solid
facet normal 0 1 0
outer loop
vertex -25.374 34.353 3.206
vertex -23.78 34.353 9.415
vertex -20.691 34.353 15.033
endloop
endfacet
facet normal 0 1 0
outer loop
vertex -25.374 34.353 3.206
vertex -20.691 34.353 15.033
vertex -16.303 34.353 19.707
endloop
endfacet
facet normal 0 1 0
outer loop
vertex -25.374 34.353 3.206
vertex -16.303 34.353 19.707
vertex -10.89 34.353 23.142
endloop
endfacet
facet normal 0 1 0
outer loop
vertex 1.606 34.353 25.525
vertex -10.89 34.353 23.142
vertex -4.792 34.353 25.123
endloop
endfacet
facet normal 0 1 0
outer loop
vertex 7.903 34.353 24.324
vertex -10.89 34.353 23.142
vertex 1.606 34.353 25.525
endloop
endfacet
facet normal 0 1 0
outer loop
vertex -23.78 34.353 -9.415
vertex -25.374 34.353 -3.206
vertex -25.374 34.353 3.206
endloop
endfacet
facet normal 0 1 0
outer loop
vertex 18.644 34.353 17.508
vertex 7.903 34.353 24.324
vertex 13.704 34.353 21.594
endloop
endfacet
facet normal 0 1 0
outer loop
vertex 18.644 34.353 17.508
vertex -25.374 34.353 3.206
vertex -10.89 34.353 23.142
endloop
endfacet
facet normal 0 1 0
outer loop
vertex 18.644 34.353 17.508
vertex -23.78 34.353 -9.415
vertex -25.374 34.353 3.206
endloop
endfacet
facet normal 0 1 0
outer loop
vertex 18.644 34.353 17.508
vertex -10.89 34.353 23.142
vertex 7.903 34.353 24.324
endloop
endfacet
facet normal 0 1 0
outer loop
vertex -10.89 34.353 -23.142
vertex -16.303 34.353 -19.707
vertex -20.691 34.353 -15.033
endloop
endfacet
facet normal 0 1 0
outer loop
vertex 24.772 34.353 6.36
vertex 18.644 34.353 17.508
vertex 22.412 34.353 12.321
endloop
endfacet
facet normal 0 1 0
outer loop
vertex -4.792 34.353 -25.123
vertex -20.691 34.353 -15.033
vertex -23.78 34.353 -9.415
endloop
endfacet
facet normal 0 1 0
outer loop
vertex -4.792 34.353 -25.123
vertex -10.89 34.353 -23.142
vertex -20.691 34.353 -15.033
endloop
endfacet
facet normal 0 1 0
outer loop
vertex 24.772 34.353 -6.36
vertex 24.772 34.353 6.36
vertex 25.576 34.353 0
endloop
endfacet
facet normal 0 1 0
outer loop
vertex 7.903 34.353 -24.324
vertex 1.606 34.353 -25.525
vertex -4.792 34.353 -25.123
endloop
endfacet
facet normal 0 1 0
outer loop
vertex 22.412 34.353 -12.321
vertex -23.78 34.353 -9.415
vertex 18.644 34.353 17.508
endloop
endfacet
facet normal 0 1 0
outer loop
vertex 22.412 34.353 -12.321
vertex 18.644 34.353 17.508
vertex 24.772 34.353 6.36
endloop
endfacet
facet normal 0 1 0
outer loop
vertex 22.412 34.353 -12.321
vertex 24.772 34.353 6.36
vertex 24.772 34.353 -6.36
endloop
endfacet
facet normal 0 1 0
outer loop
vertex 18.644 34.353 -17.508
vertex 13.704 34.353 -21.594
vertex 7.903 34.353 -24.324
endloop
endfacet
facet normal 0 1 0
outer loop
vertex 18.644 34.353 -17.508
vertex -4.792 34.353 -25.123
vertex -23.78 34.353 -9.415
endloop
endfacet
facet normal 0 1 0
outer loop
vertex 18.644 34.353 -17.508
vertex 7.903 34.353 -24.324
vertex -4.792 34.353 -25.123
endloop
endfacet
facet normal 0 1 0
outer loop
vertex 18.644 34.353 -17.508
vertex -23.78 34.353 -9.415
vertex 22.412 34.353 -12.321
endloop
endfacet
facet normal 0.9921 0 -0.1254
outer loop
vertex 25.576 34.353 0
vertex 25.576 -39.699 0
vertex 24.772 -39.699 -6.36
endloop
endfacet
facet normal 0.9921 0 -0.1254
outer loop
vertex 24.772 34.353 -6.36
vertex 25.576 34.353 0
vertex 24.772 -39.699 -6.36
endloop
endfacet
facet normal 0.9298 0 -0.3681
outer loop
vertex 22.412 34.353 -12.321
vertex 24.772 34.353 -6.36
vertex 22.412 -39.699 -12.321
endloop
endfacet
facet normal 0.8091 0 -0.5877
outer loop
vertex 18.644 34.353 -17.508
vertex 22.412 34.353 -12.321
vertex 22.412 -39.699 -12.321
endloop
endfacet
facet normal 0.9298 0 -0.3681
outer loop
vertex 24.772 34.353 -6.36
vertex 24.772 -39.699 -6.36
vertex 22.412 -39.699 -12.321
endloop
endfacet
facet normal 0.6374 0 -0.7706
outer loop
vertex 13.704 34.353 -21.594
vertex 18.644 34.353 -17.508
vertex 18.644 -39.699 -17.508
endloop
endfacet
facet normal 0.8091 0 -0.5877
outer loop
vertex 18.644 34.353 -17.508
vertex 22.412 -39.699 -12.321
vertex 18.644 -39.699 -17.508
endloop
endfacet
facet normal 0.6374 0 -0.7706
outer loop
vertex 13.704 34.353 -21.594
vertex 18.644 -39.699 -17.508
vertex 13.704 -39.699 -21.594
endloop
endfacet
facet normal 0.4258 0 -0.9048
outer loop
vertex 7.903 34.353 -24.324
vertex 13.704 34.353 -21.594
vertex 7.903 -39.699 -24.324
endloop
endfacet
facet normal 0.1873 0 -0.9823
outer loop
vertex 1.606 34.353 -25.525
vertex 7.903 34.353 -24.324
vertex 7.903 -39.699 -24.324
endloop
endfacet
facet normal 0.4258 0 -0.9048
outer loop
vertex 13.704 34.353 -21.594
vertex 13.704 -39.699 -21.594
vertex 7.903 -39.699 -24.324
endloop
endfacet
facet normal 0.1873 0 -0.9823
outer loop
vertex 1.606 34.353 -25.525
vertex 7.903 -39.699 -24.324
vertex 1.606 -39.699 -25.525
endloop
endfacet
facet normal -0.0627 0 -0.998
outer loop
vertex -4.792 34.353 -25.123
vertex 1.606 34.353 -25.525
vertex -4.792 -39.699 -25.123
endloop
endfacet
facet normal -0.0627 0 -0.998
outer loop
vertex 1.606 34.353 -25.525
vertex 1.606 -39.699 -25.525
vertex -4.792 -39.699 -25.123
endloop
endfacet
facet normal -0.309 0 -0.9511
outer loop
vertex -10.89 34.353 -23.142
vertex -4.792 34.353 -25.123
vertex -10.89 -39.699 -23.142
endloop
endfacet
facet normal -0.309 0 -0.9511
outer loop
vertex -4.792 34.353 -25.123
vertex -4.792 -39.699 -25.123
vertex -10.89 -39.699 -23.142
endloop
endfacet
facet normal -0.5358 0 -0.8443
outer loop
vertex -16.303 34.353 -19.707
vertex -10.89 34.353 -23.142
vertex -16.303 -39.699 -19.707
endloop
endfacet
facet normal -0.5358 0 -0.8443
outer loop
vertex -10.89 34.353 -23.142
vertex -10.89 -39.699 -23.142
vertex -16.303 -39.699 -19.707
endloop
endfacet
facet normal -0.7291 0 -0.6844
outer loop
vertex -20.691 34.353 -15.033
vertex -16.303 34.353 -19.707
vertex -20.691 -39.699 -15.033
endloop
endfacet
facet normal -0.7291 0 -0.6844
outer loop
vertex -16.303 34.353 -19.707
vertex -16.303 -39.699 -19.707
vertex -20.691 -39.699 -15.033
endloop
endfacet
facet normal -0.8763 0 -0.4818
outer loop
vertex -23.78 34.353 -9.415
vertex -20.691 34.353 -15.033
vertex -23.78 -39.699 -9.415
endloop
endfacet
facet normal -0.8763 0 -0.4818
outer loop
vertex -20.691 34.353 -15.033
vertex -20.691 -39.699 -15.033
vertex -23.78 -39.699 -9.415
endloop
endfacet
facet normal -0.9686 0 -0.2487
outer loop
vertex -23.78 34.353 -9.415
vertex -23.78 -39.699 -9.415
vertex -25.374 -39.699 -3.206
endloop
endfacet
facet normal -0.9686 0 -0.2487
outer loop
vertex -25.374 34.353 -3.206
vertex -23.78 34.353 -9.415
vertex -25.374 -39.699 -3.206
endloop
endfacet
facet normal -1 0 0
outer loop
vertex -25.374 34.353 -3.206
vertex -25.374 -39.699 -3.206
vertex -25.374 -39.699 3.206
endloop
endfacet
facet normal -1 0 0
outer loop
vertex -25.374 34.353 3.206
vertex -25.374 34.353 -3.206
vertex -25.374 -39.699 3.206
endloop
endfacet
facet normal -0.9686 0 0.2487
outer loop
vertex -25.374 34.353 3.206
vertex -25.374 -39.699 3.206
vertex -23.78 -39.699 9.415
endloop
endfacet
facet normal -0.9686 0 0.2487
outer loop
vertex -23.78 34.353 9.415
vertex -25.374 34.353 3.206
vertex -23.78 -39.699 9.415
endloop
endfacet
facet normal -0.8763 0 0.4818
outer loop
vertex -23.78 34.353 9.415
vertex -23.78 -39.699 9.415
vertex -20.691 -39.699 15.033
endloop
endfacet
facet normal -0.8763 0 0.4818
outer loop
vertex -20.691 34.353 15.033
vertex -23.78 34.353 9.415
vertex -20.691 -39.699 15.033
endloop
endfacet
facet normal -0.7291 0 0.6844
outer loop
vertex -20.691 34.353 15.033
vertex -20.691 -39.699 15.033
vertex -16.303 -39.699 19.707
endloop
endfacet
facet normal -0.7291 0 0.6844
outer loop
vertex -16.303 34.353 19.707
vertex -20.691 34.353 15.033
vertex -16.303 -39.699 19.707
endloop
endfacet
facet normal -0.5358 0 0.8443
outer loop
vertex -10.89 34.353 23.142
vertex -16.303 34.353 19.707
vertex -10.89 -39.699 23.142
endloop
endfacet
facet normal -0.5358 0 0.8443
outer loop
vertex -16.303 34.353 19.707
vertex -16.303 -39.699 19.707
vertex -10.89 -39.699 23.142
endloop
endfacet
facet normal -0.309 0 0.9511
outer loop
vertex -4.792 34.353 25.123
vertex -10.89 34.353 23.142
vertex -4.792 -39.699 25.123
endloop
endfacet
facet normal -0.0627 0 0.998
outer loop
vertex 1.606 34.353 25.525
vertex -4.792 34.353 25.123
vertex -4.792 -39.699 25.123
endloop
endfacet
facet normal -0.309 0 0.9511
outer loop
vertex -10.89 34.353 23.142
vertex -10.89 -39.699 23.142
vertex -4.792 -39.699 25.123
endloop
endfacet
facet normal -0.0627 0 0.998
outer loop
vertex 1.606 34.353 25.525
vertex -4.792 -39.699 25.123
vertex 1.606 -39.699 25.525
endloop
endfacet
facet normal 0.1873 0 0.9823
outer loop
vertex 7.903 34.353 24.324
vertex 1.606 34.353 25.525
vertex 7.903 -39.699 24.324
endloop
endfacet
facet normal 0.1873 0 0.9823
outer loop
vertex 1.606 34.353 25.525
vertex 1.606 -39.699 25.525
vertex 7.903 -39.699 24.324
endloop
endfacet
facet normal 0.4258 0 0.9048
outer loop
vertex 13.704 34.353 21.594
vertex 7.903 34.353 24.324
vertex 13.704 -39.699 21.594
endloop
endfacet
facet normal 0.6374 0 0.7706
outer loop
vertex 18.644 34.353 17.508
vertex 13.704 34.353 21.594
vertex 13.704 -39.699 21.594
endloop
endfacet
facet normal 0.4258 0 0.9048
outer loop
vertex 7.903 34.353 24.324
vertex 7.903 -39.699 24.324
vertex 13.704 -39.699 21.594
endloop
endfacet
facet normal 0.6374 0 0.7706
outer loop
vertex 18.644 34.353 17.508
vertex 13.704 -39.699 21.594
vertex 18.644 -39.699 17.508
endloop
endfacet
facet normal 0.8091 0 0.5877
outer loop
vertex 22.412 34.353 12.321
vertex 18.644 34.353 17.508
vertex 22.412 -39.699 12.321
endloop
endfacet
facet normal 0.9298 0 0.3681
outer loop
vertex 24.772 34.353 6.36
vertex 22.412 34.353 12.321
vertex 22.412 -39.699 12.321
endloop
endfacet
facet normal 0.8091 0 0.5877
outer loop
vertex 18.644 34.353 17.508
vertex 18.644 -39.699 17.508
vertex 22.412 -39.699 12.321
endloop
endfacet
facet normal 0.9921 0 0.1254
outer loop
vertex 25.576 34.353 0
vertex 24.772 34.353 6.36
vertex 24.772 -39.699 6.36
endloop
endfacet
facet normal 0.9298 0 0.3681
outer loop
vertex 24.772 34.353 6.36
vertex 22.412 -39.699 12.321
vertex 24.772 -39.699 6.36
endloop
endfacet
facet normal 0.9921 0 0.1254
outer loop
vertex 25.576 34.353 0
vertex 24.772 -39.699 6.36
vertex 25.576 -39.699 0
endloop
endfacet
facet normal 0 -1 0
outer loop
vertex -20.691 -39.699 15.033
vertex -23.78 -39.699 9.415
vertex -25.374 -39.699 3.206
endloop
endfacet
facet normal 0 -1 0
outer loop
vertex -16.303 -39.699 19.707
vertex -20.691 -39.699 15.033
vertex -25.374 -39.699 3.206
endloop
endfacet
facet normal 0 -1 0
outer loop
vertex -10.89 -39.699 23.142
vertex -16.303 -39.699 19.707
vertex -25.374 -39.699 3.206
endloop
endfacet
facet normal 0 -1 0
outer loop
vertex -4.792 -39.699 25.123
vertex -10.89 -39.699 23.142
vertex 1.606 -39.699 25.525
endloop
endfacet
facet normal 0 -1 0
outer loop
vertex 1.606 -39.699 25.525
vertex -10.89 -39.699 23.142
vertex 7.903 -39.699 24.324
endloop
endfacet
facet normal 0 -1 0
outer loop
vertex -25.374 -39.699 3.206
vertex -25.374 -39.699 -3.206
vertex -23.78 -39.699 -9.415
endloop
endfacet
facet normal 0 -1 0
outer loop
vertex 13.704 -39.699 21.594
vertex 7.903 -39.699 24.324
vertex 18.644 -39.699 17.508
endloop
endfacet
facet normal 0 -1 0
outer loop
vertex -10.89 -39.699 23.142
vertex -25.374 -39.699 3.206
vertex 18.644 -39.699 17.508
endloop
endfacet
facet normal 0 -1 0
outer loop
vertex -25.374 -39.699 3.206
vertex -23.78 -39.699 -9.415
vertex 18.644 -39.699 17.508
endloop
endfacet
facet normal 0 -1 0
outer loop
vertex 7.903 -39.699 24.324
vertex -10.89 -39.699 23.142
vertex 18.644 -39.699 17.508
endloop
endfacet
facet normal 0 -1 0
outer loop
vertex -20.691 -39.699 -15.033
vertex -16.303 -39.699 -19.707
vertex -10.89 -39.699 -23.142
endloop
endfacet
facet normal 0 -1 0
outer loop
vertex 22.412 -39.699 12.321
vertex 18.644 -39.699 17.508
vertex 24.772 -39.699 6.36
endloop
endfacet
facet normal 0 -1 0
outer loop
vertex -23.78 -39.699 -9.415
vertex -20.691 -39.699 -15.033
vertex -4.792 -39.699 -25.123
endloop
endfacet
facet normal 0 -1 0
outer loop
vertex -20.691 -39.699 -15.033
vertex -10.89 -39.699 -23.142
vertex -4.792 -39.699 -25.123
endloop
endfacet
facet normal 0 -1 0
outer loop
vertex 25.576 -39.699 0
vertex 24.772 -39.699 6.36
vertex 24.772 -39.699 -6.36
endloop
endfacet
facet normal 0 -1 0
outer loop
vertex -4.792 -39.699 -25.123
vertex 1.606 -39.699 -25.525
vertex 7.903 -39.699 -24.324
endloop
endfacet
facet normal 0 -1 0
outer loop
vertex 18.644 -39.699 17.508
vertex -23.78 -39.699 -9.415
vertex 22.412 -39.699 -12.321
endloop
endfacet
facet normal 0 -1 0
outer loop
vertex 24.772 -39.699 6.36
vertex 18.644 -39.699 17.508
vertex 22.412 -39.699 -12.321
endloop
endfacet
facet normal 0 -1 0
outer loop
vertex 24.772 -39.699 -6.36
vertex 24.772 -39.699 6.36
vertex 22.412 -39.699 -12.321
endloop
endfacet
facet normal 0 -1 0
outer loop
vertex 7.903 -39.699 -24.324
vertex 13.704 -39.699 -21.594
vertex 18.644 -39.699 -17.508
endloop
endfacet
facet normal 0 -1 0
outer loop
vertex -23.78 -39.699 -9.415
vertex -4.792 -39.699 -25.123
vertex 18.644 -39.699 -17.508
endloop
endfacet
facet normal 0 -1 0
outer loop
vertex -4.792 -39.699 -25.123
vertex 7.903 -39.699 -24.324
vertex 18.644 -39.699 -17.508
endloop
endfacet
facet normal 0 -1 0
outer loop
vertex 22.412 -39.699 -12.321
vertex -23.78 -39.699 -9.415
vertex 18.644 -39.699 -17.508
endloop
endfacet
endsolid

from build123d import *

# Parameters (mm, degrees)
OFFICIAL_SURFACE_TRIM_START     = -39.698691123
OFFICIAL_SURFACE_TRIM_OUTLINE_R = 25.575864924
OFFICIAL_SURFACE_TRIM_DEPTH     = 74.051423841


# Read off the part's stored shape, not the designer's step: official_surface_trim
with BuildPart() as part:
    # official_surface_trim outline → official_surface_trim (new body)
    with BuildSketch(Plane(origin=(0, 0, 0), x_dir=(1, 0, 0), z_dir=(0, 1, 0)).offset(OFFICIAL_SURFACE_TRIM_START)):
        Circle(OFFICIAL_SURFACE_TRIM_OUTLINE_R)
    extrude(amount=OFFICIAL_SURFACE_TRIM_DEPTH)


solid = part.part
